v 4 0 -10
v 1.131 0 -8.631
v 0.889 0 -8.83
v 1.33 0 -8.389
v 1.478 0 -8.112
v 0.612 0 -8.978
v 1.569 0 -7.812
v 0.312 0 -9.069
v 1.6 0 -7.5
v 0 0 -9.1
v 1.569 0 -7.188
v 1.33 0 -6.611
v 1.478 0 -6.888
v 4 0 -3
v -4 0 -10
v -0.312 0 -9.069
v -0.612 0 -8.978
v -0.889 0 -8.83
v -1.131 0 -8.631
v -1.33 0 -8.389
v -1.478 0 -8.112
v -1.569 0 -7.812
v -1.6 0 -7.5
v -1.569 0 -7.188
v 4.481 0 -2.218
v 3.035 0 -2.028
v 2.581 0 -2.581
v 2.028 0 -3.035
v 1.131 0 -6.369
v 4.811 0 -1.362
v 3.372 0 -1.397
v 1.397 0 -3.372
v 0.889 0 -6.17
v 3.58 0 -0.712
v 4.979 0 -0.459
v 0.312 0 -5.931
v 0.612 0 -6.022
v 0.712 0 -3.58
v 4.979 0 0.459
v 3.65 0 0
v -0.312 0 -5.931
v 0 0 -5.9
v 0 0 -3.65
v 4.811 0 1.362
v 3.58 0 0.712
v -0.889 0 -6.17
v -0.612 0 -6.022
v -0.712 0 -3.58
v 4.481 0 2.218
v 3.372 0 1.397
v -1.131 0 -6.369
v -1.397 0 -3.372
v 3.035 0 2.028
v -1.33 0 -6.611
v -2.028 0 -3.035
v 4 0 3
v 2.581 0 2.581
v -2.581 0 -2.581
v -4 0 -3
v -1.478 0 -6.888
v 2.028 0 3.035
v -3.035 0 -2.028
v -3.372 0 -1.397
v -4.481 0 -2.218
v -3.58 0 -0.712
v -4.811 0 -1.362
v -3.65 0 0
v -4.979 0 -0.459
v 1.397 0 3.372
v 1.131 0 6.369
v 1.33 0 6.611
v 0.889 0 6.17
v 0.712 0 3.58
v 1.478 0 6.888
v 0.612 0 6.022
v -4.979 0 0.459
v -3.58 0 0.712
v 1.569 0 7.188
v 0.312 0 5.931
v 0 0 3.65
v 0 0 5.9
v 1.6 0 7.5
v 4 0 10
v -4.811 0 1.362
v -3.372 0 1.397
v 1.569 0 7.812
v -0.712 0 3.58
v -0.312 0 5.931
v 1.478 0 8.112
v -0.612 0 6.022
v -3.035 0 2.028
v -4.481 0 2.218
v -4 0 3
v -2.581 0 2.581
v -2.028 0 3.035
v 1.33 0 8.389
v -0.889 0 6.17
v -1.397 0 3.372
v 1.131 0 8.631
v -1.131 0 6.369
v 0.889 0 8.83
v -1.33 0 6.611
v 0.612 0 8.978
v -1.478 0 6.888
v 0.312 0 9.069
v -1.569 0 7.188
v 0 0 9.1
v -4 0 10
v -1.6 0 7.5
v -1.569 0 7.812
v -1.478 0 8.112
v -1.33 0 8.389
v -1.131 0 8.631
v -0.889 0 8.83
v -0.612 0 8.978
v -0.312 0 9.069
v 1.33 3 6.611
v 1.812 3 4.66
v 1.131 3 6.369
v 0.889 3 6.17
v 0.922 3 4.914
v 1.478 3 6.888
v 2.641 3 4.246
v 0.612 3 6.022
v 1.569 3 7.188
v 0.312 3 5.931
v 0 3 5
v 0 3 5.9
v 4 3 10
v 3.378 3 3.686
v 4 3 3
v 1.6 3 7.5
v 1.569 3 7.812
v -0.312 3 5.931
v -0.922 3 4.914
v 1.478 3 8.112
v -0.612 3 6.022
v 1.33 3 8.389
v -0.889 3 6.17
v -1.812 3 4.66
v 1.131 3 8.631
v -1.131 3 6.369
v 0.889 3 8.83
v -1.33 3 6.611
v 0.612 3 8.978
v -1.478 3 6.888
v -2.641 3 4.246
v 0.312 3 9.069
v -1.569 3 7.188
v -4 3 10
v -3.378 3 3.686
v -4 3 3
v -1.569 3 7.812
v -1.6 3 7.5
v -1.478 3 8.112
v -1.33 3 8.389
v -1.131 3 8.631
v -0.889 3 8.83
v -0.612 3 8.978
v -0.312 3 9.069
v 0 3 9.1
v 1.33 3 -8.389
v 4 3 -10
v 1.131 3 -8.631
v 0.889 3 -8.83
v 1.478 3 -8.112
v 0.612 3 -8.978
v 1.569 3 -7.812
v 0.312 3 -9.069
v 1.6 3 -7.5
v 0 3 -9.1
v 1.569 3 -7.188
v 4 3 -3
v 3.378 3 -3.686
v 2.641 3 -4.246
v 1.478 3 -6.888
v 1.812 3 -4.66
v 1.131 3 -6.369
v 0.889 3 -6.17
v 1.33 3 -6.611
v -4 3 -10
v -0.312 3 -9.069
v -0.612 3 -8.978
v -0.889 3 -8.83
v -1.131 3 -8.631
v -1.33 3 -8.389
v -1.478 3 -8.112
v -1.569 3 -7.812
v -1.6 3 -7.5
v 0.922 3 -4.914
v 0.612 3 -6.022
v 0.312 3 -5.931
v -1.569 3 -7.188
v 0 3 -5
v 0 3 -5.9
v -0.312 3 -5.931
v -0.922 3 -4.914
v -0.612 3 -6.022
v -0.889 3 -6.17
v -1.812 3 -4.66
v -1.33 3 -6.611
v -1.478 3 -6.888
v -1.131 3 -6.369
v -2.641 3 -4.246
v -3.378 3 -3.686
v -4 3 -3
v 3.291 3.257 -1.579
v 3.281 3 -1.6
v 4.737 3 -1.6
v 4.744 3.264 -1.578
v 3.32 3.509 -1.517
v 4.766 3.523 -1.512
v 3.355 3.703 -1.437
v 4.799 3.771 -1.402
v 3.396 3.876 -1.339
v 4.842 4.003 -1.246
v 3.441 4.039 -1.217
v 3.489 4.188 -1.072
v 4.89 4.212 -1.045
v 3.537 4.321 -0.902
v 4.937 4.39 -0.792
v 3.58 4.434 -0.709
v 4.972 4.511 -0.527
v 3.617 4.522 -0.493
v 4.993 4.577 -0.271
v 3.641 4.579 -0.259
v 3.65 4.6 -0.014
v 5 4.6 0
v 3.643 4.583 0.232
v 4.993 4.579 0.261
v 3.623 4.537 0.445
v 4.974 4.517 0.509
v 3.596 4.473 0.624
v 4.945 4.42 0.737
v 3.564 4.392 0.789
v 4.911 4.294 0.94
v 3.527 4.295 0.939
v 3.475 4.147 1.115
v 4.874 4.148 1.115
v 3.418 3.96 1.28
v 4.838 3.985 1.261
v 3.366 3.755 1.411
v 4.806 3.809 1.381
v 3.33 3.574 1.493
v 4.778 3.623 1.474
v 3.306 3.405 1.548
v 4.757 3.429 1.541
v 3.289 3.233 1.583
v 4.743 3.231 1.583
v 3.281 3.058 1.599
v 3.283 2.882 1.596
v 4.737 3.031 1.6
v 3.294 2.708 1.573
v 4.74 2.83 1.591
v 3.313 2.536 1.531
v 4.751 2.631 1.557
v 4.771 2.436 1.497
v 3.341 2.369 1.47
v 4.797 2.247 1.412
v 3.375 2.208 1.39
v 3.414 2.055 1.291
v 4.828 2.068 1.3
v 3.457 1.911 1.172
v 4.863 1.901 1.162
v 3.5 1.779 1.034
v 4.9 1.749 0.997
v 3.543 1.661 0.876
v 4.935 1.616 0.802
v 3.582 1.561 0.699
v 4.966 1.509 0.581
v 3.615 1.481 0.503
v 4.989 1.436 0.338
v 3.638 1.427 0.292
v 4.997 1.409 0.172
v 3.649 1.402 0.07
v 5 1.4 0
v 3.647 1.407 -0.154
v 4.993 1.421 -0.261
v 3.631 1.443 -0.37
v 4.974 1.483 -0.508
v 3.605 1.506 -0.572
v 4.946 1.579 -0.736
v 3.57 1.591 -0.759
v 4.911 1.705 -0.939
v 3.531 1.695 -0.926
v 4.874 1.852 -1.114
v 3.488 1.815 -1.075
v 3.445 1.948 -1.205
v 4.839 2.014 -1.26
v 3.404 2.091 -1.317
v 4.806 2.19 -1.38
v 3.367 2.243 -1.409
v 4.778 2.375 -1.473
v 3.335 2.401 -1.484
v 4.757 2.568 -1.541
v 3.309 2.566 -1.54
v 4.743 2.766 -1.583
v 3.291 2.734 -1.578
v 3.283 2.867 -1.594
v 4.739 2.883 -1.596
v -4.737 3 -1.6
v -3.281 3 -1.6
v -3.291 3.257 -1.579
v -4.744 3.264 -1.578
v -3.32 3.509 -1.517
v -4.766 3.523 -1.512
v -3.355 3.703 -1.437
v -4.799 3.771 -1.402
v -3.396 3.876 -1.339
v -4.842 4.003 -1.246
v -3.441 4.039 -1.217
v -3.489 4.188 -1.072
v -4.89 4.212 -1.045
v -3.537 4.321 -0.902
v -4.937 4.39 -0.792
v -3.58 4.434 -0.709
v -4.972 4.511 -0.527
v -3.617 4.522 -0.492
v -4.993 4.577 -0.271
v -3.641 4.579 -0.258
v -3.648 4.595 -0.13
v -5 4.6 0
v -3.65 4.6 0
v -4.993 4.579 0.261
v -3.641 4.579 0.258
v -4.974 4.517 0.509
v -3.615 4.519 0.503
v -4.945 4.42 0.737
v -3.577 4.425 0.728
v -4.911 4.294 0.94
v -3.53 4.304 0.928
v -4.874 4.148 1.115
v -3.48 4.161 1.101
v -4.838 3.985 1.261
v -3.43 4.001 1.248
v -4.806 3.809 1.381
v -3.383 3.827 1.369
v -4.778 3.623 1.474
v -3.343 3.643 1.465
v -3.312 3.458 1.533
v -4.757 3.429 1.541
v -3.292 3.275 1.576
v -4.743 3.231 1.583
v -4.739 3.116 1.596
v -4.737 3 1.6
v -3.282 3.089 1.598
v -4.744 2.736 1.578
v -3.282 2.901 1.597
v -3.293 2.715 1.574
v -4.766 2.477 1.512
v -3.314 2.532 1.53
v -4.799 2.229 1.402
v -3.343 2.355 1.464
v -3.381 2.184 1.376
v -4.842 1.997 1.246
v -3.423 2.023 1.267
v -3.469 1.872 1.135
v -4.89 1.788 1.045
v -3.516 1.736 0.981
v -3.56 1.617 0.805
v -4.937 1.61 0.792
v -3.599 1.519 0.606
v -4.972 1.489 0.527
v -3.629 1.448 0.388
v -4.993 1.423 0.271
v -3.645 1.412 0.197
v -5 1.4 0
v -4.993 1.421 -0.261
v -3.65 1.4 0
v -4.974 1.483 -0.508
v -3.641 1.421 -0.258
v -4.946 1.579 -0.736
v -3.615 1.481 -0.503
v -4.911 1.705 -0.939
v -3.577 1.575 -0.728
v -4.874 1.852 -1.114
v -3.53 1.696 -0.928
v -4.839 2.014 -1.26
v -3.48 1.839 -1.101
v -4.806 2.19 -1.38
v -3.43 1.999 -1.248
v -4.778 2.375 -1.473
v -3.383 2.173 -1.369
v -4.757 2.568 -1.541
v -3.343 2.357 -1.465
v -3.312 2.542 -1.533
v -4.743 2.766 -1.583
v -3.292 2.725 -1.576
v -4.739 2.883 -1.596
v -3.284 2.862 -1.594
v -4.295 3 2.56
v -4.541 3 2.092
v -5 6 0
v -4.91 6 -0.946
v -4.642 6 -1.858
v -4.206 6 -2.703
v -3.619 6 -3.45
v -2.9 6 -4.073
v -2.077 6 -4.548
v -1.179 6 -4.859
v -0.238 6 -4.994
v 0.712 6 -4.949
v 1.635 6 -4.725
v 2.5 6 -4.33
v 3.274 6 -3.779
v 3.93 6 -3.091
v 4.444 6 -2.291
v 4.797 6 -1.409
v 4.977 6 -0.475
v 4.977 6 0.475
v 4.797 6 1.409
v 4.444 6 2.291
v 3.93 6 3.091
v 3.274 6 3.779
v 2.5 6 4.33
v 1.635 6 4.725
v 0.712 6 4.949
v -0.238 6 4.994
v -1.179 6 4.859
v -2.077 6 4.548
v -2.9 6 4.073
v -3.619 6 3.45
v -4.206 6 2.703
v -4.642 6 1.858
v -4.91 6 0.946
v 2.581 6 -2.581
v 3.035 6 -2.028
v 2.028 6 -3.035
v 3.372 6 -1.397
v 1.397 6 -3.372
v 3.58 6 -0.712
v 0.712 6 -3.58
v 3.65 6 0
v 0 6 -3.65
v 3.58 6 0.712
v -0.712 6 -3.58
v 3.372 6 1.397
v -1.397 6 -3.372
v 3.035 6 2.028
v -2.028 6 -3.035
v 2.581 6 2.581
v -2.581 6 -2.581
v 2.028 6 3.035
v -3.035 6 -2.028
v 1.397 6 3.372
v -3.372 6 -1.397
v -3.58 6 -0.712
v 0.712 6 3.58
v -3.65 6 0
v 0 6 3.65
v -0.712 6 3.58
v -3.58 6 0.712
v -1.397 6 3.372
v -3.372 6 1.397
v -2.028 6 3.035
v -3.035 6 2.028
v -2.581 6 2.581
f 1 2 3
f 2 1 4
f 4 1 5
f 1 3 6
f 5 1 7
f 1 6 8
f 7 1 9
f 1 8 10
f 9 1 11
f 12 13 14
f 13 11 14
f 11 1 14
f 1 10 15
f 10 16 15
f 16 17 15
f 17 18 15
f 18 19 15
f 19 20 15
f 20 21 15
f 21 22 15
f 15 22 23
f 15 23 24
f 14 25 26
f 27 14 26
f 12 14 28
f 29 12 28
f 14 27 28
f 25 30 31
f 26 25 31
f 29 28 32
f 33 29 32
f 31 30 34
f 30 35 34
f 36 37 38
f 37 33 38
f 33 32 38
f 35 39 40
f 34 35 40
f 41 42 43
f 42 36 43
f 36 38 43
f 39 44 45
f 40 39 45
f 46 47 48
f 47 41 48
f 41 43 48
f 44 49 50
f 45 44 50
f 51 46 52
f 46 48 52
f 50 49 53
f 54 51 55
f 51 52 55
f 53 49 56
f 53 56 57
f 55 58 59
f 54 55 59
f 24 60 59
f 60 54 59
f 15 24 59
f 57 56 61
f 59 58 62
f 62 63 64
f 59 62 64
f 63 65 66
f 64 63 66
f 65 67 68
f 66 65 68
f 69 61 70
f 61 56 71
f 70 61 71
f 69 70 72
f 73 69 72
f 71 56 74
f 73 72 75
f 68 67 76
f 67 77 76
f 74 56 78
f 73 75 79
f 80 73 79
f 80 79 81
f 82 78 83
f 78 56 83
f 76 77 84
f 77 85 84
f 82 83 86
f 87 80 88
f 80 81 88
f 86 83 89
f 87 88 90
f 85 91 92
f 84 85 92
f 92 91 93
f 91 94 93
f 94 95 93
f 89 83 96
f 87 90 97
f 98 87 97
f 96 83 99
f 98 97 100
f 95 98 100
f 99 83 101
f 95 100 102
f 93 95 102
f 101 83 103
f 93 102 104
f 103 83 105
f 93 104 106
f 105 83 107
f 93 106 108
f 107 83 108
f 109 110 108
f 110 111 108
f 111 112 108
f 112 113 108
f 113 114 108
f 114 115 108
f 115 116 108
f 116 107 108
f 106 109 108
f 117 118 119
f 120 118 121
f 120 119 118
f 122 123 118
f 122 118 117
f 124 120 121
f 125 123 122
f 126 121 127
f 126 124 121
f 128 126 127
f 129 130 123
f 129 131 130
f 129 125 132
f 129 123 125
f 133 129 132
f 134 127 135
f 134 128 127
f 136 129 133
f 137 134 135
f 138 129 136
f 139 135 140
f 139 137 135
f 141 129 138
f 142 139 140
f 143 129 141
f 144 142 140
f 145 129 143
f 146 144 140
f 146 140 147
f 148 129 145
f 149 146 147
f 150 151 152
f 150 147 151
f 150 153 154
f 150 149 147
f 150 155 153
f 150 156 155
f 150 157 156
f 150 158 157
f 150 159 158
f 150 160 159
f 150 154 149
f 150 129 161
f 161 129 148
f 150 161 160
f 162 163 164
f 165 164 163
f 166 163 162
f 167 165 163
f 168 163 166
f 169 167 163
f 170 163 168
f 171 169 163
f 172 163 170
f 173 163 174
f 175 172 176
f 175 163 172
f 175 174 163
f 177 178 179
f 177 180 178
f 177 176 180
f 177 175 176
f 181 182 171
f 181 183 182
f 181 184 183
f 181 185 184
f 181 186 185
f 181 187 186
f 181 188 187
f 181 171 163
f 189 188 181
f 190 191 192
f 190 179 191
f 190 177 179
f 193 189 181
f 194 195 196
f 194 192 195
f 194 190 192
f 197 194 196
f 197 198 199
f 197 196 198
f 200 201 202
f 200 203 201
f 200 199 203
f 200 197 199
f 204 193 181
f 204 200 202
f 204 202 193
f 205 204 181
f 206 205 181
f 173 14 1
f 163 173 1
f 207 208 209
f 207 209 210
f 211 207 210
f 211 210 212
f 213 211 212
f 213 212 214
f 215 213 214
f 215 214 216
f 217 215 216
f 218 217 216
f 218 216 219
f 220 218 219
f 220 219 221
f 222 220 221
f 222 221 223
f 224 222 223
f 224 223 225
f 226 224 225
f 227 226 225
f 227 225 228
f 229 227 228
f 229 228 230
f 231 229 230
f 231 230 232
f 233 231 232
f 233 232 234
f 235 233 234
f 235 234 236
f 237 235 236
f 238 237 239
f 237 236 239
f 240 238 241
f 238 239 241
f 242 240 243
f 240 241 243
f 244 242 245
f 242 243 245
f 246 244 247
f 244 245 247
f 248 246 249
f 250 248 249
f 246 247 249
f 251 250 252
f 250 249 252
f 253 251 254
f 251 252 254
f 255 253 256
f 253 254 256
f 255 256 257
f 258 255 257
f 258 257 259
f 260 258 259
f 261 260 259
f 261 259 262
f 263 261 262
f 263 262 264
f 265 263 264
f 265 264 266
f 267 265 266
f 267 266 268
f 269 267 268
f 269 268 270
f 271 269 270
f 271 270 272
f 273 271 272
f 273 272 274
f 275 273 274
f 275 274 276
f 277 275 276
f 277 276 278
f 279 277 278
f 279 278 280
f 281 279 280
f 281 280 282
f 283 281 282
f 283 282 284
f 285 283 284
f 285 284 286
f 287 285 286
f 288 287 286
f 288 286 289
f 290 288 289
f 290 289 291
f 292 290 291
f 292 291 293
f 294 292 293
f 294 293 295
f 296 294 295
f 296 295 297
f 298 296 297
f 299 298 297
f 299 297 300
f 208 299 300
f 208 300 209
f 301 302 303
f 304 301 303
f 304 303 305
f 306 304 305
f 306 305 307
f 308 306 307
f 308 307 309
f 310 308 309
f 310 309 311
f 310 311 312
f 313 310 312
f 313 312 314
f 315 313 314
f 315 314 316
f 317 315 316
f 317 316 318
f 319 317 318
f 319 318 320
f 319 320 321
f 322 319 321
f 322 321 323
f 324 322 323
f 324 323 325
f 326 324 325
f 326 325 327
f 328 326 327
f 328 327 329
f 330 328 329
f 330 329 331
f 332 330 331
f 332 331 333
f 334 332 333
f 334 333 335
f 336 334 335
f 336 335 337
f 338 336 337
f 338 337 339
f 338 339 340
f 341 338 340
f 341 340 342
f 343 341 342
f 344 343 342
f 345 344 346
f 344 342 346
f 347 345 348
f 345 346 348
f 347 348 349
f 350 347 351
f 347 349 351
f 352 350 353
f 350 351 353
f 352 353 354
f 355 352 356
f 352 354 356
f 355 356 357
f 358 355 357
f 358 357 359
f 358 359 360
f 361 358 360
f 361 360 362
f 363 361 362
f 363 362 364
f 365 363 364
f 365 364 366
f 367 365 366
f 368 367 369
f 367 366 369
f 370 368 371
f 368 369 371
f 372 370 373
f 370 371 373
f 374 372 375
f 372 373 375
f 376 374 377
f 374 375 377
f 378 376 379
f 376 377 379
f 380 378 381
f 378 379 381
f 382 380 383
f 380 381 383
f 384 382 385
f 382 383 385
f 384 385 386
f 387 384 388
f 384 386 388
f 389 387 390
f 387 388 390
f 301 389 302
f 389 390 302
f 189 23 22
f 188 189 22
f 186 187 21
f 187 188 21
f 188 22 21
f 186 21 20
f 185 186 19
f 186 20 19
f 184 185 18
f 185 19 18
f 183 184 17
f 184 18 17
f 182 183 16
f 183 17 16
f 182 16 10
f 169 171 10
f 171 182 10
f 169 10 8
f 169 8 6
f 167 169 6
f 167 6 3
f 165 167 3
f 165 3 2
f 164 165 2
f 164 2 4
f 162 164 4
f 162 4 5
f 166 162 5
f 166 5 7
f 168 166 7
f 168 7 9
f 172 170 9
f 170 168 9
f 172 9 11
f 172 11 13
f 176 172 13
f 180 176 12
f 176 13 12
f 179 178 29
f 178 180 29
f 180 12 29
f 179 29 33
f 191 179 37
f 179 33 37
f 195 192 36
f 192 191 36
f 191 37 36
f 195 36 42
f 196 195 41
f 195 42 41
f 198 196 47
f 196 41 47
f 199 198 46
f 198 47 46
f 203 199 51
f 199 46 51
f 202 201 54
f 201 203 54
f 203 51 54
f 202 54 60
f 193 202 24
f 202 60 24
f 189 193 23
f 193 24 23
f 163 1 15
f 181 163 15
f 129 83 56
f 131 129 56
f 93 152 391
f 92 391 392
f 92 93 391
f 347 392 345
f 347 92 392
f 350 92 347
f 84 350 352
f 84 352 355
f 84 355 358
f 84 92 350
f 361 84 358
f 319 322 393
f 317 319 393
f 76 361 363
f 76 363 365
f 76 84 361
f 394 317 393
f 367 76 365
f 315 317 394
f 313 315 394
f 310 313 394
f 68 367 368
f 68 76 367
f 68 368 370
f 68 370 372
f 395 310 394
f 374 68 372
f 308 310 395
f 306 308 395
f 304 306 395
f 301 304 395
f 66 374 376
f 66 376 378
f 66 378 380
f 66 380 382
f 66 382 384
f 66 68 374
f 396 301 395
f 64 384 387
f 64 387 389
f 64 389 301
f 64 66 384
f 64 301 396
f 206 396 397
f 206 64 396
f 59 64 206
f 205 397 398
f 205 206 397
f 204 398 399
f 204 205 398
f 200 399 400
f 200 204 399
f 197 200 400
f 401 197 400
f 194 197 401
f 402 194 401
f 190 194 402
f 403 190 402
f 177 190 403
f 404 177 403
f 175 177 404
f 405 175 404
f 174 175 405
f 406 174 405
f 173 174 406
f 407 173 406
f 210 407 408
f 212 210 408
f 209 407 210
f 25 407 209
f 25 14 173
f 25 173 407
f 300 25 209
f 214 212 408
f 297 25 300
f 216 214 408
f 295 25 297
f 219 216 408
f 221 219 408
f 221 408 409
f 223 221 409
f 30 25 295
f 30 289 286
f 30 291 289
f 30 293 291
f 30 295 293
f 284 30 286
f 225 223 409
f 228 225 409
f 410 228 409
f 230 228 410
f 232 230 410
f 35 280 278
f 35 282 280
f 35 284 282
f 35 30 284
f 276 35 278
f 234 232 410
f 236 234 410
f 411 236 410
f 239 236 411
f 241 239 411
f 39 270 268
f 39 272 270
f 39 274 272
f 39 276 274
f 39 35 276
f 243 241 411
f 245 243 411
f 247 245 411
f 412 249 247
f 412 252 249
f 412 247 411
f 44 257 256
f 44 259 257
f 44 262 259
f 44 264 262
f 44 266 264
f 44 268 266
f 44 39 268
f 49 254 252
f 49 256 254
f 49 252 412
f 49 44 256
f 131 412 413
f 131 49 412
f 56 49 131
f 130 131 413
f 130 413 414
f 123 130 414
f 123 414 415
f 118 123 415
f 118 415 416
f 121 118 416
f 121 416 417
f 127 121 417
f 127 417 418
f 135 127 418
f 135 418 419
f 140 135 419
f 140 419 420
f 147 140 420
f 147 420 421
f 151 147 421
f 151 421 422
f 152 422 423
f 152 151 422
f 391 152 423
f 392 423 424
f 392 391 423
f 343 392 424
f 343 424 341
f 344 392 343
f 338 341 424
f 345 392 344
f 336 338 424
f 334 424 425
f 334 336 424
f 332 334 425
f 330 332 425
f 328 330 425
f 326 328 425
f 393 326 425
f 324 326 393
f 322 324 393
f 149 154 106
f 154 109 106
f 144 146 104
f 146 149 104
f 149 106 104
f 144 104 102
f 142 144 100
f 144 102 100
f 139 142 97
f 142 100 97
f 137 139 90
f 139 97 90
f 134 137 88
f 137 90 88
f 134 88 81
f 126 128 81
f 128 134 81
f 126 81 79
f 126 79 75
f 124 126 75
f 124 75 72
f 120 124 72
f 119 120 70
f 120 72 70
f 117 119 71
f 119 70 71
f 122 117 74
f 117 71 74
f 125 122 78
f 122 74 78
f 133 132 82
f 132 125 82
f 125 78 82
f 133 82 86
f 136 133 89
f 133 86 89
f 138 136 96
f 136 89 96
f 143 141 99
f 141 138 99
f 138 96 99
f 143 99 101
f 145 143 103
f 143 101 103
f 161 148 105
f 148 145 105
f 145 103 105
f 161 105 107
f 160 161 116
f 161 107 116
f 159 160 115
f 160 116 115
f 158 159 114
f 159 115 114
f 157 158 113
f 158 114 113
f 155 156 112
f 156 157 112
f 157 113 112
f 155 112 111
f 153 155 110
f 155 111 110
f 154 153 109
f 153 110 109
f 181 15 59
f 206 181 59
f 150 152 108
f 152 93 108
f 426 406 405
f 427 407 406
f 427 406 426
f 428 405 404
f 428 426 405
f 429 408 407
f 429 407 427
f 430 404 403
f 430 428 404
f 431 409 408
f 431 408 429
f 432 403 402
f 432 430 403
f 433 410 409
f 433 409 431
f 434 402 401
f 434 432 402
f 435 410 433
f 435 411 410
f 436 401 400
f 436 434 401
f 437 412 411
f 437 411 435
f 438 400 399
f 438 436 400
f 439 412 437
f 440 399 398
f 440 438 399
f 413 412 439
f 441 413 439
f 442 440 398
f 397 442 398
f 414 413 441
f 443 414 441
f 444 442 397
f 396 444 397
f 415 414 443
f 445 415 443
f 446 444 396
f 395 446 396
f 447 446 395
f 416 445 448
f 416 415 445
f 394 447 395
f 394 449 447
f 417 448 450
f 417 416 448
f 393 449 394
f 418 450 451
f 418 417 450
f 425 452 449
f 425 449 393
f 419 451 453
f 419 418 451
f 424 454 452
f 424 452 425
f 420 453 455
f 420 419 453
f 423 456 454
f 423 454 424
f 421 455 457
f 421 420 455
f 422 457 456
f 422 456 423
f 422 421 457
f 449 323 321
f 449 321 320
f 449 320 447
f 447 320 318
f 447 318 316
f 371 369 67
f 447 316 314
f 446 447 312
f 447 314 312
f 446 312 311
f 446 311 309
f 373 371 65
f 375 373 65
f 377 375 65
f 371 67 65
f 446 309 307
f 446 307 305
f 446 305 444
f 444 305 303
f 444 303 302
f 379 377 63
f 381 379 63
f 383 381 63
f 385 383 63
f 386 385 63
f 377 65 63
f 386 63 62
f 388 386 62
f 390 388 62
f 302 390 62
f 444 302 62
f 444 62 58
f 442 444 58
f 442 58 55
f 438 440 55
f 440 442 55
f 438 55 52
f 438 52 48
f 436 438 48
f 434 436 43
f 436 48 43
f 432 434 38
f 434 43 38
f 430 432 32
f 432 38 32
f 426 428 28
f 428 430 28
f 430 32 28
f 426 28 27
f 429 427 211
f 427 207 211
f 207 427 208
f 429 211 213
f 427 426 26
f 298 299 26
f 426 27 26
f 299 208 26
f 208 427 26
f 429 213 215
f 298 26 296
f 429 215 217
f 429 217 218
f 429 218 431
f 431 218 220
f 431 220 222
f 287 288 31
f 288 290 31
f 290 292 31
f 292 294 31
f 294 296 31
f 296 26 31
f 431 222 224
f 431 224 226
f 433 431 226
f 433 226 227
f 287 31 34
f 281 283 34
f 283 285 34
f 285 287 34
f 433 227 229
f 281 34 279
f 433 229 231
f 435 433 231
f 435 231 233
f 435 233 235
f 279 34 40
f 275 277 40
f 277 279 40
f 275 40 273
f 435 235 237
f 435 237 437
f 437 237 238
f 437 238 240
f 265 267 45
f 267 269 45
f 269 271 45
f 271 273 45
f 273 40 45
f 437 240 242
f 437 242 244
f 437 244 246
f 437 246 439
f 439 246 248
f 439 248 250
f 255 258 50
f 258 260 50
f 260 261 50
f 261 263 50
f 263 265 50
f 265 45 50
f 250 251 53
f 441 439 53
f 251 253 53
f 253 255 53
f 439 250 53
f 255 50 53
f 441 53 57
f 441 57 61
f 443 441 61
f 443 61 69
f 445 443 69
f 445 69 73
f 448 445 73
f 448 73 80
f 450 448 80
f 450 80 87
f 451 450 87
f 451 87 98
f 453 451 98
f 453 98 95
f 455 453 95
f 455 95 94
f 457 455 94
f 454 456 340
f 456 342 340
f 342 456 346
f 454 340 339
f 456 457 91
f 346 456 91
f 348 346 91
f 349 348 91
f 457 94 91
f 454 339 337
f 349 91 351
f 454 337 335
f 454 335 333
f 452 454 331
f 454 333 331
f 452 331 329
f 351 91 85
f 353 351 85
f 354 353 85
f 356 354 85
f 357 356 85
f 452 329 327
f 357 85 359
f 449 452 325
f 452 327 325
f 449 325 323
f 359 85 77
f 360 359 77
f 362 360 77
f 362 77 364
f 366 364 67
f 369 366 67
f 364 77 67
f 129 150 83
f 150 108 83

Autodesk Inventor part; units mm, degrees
ref_plane "YZ Plane" through (0, 0, 0) normal (1, 0, 0) x (0, 1, 0)
ref_plane "XZ Plane" through (0, 0, 0) normal (0, 1, 0) x (-1, 0, 0)
sketch "Sketch1" plane through (0, 0, 0) normal (0, 1, 0) x (-1, 0, 0)
  circle A0 centre (0, 0) radius 3.65
  circle A1 centre (0, 0) radius 5
  line L0 (4, 10) -> (-4, 10)
  line L1 (-4, 10) -> (-4, -10)
  line L2 (-4, -10) -> (4, -10)
  line L3 (4, -10) -> (4, 10)
  line L4 (4, 10) -> (-4, -10) construction
  line L5 (-4, 10) -> (4, -10) construction
  circle A2 centre (0, 7.5) radius 1.6
  circle A3 centre (0, -7.5) radius 1.6
  point P0 (4, -3)
  point P1 (-4, -3)
  point P2 (4, 3)
  point P3 (-4, 3)
  dimension "d0" = 7.3
  dimension "d1" = 10
  dimension "d2" = 20
  dimension "d3" = 3.2
  dimension "d4" = 2.5
  dimension "d5" = 3.2
  dimension "d6" = 2.5
extrude "Extrusion1" add sketch "Sketch1" along normal blind 3 contours A1 L3 | A1 L1 L0 L3 | L3 L2 L1 A1 | L1 A1
extrude "Extrusion2" add sketch "Sketch1" along normal blind 6 contours A1 L3 | L3 A1 L1 | L1 A1
ref_plane "Work Plane1" through (5, 0, 0) normal (1, 0, 0) x (0, 0, -1)
sketch "Sketch2" plane through (5, 0, 0) normal (1, 0, 0) x (0, 0, -1)
  circle A0 centre (0, 3) radius 1.6
  point P0 (0, 0)
  dimension "d11" = 3.2
extrude "Extrusion3" cut sketch "Sketch2" against normal blind 10
properties part number "Fix Bracket Lifter"
